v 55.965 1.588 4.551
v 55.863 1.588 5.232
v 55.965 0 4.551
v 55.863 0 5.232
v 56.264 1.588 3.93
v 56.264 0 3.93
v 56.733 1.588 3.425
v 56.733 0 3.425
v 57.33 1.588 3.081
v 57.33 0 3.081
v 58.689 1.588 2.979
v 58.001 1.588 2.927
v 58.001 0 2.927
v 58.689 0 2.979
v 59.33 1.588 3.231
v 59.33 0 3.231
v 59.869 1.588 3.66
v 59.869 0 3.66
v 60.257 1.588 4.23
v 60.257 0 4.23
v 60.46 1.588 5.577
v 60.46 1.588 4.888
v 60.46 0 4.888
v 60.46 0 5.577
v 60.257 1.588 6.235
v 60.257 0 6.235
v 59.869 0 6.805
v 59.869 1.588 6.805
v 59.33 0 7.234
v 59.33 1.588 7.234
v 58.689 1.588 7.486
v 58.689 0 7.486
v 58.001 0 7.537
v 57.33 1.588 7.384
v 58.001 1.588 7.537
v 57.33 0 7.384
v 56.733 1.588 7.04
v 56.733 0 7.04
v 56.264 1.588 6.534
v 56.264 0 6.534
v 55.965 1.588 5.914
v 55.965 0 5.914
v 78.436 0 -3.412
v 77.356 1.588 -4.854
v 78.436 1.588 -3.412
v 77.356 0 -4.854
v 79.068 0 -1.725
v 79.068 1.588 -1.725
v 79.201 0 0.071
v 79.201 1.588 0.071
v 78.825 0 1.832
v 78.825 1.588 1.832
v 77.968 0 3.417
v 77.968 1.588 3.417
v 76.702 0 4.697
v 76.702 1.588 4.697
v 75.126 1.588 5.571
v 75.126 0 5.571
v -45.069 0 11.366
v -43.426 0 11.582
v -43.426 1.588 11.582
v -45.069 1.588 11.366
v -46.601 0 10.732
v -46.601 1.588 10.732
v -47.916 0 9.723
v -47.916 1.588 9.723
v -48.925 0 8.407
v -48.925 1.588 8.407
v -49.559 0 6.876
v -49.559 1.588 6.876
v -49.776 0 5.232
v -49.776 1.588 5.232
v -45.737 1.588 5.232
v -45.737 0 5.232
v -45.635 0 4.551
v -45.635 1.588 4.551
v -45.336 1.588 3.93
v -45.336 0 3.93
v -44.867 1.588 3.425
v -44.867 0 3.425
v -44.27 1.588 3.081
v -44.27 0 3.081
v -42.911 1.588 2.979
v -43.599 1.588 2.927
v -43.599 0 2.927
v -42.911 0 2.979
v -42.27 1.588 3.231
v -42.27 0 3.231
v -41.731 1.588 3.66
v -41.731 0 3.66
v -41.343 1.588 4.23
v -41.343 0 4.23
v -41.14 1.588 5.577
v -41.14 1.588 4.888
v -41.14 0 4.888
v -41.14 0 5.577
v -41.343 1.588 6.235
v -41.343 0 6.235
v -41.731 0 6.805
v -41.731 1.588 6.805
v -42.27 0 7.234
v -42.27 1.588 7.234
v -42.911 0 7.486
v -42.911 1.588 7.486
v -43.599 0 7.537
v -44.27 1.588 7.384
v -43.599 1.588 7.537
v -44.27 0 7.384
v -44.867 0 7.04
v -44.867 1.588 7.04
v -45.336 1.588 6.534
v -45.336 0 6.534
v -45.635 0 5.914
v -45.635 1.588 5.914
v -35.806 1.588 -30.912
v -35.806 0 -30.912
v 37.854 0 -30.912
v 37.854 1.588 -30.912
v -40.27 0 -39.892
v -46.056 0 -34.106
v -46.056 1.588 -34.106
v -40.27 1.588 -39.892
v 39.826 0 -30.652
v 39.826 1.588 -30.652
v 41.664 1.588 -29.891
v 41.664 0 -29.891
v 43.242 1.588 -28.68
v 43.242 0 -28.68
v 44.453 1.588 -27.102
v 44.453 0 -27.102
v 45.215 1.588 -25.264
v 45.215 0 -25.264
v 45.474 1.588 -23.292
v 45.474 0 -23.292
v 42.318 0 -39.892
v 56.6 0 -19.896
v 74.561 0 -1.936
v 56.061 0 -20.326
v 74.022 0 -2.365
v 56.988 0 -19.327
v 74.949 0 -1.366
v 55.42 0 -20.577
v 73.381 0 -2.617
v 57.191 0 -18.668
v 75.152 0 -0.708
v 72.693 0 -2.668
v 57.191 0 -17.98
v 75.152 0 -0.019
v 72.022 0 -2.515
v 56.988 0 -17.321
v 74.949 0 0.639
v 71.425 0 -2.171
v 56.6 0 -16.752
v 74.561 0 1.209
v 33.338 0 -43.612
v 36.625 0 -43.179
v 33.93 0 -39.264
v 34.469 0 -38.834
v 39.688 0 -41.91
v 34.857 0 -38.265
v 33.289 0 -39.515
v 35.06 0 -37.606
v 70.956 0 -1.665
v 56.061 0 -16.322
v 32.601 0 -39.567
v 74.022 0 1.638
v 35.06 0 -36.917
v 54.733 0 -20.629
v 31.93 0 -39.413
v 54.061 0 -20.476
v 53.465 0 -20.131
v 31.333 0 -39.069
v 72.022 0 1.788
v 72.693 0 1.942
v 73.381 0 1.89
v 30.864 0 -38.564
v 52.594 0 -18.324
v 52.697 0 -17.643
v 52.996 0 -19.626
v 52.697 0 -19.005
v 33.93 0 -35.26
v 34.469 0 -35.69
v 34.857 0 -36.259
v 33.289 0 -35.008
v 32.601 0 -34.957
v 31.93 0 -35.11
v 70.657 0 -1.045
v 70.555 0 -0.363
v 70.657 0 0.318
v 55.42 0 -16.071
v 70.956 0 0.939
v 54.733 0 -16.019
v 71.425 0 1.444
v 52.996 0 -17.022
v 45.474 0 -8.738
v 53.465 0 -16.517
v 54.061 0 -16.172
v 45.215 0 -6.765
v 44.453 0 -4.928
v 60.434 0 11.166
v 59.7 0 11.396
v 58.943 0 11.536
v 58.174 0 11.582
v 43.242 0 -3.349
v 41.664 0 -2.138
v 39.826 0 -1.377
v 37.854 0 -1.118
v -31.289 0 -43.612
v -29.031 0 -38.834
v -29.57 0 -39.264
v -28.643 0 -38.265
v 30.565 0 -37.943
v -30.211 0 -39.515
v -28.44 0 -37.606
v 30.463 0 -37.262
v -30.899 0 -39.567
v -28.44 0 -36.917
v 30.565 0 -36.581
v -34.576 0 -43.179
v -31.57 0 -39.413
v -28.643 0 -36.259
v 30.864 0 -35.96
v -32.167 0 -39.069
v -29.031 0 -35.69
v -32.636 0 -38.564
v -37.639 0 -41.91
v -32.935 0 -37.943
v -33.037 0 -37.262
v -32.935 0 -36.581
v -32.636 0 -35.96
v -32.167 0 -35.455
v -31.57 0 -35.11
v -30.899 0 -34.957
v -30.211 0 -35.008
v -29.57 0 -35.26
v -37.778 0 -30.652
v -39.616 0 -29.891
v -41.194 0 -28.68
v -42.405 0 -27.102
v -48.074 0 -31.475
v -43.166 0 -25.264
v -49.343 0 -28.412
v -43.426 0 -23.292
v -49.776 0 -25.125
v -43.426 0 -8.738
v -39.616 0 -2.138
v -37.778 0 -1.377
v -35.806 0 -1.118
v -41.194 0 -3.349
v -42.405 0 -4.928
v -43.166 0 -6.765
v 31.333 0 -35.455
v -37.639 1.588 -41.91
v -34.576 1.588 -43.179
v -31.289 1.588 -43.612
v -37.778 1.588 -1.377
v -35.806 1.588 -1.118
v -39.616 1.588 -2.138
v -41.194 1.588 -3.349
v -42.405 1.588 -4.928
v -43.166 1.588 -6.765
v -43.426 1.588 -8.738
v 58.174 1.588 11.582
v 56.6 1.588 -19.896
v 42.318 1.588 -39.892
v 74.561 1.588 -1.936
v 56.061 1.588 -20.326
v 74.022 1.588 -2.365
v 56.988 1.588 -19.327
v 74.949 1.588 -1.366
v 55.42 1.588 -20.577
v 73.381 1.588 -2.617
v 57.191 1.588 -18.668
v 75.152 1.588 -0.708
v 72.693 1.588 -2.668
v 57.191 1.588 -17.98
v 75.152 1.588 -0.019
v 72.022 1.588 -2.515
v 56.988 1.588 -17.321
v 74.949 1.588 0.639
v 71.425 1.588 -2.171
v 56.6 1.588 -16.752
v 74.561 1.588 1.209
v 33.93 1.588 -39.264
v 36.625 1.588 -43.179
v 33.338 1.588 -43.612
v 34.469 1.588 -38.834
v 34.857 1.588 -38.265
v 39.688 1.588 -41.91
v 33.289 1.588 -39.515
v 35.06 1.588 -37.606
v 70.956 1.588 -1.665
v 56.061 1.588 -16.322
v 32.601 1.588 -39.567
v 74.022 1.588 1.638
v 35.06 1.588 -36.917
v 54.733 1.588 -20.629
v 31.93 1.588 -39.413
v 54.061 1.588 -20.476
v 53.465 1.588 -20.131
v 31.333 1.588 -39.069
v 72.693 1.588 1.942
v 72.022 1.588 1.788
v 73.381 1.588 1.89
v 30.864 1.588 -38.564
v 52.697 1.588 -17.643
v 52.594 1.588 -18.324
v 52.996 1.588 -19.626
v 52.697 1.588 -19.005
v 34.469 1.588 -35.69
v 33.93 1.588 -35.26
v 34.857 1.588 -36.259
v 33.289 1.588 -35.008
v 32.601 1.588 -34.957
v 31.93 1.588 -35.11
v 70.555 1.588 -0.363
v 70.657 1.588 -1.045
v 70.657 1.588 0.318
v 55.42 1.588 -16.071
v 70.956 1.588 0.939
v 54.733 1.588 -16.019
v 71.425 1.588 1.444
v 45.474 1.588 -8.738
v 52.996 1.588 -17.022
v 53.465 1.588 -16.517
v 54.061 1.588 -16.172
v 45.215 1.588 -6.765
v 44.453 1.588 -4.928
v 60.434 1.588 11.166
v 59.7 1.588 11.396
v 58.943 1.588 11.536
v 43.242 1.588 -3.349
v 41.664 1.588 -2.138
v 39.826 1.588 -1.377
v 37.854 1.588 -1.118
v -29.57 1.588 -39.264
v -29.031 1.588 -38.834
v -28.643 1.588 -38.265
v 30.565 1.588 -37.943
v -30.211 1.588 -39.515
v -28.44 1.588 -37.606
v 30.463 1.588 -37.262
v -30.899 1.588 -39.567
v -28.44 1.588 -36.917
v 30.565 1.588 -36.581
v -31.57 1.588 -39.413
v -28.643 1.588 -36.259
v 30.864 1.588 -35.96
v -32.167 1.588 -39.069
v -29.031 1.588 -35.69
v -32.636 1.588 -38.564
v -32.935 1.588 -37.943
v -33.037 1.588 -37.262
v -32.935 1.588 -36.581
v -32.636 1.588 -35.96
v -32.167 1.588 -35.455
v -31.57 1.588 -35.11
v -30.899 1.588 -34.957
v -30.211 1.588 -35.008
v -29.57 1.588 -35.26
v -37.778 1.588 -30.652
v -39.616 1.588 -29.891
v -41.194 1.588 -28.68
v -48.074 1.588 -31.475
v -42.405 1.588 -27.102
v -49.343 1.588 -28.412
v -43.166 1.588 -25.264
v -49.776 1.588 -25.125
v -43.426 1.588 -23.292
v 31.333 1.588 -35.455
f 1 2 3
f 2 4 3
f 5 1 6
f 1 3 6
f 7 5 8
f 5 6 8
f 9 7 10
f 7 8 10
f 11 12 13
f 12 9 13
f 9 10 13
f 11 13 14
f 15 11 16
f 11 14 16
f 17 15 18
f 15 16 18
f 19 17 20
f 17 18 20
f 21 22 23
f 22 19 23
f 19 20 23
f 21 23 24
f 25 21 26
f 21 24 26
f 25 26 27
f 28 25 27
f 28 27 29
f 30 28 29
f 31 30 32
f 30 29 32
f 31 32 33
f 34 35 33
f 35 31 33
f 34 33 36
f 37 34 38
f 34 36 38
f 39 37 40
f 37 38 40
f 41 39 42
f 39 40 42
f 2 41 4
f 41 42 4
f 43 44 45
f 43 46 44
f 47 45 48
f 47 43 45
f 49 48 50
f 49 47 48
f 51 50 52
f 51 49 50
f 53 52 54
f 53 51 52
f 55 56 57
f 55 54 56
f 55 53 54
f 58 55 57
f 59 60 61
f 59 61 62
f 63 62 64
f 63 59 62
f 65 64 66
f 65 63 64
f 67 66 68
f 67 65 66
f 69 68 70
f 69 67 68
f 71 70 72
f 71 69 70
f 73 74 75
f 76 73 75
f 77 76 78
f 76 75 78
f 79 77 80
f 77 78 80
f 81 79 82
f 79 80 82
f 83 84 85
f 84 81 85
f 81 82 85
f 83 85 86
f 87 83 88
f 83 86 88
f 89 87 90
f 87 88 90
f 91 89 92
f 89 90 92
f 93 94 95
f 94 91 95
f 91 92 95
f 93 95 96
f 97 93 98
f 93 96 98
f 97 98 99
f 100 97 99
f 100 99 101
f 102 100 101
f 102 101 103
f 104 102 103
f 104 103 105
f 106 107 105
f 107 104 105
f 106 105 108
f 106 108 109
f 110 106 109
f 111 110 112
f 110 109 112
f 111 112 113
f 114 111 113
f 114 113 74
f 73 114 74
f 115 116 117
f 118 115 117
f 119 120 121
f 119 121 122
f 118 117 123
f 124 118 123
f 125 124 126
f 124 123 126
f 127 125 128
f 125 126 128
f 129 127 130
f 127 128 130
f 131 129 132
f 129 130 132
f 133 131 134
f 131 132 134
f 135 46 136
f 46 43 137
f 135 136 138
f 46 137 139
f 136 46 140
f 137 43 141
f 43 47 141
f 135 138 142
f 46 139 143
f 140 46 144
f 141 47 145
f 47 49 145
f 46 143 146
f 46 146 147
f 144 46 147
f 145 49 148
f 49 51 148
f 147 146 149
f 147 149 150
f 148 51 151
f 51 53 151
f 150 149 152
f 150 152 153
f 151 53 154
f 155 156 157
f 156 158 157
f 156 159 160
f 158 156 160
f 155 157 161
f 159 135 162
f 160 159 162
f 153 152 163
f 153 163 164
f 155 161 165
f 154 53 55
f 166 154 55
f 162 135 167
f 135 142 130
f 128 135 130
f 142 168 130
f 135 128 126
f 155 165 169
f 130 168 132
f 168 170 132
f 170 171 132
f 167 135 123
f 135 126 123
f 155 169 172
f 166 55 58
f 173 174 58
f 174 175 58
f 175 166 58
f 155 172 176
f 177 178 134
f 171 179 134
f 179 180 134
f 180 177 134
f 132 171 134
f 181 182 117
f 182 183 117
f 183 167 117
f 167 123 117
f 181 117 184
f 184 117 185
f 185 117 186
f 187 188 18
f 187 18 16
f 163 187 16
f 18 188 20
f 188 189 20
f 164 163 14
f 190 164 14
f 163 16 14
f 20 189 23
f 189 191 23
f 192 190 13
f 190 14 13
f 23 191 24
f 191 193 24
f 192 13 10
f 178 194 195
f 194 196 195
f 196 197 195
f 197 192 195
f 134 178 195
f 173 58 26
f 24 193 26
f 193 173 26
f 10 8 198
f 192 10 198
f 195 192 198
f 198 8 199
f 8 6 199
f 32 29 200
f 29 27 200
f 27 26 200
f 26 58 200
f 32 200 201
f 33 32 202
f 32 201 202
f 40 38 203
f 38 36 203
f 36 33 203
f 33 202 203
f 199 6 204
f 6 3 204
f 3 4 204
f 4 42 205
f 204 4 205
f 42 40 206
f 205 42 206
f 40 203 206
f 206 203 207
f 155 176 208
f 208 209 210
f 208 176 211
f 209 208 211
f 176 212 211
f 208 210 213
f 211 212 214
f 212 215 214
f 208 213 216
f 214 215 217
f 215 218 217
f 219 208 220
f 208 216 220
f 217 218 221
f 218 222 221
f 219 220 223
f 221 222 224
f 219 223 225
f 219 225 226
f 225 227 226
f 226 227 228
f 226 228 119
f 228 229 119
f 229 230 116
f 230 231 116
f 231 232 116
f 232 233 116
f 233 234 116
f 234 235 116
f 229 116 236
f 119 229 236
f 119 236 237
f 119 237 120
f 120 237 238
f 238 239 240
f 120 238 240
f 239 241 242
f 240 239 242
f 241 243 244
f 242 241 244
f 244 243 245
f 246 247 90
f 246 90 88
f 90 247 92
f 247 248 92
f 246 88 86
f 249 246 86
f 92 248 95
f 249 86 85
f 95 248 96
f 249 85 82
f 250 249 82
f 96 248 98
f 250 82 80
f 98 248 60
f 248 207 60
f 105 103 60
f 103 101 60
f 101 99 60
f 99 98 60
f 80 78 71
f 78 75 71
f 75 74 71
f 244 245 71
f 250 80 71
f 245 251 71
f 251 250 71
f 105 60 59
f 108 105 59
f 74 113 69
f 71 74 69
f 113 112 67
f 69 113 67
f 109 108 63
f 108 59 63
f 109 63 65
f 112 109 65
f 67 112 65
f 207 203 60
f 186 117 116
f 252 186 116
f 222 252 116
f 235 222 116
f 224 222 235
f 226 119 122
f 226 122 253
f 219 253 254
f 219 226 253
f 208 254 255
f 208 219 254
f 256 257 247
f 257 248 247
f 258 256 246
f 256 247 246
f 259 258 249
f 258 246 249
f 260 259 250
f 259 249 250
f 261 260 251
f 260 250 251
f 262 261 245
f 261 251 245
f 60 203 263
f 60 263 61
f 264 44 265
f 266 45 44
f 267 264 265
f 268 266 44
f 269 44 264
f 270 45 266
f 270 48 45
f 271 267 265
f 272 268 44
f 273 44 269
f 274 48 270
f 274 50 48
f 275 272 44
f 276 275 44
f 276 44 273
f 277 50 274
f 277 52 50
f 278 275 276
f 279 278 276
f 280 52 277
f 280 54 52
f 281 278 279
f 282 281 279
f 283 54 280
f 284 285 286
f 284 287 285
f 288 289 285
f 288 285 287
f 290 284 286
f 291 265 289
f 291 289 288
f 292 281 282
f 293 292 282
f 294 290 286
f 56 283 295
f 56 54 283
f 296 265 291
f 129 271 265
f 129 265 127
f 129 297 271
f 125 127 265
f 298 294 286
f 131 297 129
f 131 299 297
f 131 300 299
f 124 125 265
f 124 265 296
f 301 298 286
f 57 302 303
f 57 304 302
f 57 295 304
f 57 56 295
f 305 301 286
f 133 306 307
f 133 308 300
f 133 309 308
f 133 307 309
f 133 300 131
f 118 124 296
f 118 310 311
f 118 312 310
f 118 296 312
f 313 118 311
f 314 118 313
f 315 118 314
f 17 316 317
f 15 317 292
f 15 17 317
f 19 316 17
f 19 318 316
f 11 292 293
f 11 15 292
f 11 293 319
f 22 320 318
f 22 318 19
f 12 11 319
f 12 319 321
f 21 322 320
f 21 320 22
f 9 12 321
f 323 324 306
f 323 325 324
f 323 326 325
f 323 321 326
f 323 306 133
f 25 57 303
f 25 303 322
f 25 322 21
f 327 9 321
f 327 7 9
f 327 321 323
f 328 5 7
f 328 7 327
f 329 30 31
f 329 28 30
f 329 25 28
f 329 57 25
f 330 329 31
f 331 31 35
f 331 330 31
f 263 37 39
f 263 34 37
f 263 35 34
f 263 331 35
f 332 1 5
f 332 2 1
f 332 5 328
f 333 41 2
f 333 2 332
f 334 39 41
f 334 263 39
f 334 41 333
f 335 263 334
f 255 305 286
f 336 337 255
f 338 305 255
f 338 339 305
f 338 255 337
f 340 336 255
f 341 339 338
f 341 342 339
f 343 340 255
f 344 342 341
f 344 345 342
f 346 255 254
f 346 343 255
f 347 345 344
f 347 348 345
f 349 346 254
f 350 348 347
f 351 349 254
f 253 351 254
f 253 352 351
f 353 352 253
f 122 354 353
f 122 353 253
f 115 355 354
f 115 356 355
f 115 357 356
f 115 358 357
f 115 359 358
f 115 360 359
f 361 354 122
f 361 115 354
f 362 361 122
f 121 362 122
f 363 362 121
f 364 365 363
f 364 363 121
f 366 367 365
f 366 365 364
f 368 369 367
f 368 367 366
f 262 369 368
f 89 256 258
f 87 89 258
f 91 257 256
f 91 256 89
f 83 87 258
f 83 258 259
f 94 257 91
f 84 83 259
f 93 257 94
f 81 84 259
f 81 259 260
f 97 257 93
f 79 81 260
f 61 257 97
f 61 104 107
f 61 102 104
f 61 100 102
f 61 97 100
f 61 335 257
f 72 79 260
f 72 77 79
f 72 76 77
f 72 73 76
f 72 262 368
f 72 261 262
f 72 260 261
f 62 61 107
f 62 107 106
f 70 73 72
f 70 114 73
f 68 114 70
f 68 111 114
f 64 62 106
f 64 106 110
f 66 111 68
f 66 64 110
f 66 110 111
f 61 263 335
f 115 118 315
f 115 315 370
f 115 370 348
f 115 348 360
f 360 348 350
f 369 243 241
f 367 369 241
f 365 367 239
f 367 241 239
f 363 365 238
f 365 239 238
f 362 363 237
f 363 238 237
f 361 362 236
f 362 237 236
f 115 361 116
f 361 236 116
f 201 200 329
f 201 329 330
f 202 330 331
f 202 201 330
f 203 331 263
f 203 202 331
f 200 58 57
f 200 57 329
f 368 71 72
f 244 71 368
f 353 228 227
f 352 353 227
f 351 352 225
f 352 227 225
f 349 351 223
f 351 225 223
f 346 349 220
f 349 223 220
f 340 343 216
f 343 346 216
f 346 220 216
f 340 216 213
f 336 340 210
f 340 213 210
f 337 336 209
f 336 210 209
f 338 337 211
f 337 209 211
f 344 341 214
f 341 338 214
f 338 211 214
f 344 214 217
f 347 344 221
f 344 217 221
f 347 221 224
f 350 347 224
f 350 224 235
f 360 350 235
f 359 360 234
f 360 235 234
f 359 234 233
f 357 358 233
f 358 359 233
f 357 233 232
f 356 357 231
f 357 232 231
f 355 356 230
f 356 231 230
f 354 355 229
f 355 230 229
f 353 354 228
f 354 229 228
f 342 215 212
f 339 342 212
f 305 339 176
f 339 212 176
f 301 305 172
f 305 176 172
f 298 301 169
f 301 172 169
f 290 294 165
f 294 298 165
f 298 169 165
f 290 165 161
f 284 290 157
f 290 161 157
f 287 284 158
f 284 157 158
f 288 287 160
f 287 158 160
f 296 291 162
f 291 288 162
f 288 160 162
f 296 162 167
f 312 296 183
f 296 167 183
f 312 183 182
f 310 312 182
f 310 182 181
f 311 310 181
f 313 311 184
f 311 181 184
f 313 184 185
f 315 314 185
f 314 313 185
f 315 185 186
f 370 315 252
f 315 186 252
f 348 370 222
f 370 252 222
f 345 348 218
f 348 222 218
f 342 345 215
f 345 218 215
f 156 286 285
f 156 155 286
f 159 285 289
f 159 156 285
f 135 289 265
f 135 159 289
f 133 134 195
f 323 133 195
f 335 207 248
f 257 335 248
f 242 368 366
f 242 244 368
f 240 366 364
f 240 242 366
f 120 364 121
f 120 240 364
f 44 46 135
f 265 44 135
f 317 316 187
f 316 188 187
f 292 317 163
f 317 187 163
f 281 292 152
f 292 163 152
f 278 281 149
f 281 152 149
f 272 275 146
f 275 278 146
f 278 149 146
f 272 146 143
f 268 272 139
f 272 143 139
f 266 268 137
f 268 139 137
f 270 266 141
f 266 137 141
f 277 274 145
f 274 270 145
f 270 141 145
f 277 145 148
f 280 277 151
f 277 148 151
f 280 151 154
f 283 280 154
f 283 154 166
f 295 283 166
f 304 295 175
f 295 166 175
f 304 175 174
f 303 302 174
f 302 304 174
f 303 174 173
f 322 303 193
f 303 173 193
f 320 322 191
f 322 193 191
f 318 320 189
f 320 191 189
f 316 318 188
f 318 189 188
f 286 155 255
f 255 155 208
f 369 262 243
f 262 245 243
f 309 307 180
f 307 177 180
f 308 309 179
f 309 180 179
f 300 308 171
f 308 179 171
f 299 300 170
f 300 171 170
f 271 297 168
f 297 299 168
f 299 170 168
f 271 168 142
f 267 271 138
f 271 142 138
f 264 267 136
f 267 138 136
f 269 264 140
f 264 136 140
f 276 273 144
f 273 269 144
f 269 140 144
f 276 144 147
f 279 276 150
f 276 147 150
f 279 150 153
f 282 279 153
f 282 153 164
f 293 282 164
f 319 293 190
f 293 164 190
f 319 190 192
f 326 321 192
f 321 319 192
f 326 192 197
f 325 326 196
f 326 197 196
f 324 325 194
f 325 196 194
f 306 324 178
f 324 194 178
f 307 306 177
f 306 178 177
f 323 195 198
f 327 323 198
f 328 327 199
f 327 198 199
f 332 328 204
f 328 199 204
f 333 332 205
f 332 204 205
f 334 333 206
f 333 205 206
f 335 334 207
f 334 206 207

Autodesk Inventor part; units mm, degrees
ref_plane "YZ Plane" through (0, 0, 0) normal (1, 0, 0) x (0, 1, 0)
ref_plane "XZ Plane" through (0, 0, 0) normal (0, 1, 0) x (-1, 0, 0)
ref_plane "XY Plane" through (0, 0, 0) normal (0, 0, 1) x (1, 0, 0)
sketch "Sketch1" plane through (0, 0, 0) normal (0, 1, 0) x (-1, 0, 0)
  line L0 (-37.8542, -1.1176) -> (35.8058, -1.1176)
  line L1 (43.4258, -8.7376) -> (43.4258, -23.2918)
  line L2 (35.8058, -30.9118) -> (-37.8542, -30.9118)
  line L3 (-45.4742, -23.2918) -> (-45.4742, -8.7376)
  arc A0 (-37.8542, -1.1176) -> (-45.4742, -8.7376) centre (-37.8542, -8.7376) ccw
  arc A1 (-45.4742, -23.2918) -> (-37.8542, -30.9118) centre (-37.8542, -23.2918) ccw
  arc A2 (35.8058, -30.9118) -> (43.4258, -23.2918) centre (35.8058, -23.2918) ccw
  arc A3 (43.4258, -8.7376) -> (35.8058, -1.1176) centre (35.8058, -8.7376) ccw
  circle A4 centre (-72.8662, -0.3634) radius 2.3114
  circle A5 centre (-54.9057, -18.324) radius 2.3114
  circle A6 centre (-58.1742, 5.2324) radius 2.3114
  circle A7 centre (-32.7742, -37.2618) radius 2.3114
  circle A8 centre (30.7258, -37.2618) radius 2.3114
  circle A9 centre (43.4258, 5.2324) radius 2.3114
  arc A10 (49.7758, 5.2324) -> (43.4258, 11.5824) centre (43.4258, 5.2324) ccw
  arc A11 (-75.1264, 5.5707) -> (-77.3564, -4.8536) centre (-72.8662, -0.3634) ccw
  arc A12 (-58.1742, 11.5824) -> (-60.4344, 11.1665) centre (-58.1742, 5.2324) ccw
  line L4 (35.8058, -30.9118) -> (-37.8542, -30.9118)
  line L5 (-75.1264, 5.5707) -> (-60.4344, 11.1665)
  line L6 (-77.3564, -4.8536) -> (-42.3179, -39.8921)
  line L7 (-33.3376, -43.6118) -> (31.2893, -43.6118)
  line L8 (-58.1742, 11.5824) -> (43.4258, 11.5824)
  arc A13 (-42.3179, -39.8921) -> (-33.3376, -43.6118) centre (-33.3376, -30.9118) ccw
  arc A14 (35.8058, -30.9118) -> (43.4258, -23.2918) centre (35.8058, -23.2918) ccw
  line L9 (46.0561, -34.1055) -> (40.2695, -39.8921)
  arc A15 (31.2893, -43.6118) -> (40.2695, -39.8921) centre (31.2893, -30.9118) ccw
  line L10 (49.7758, 5.2324) -> (49.7758, -25.1252)
  arc A16 (46.0561, -34.1055) -> (49.7758, -25.1252) centre (37.0758, -25.1252) ccw
  point P0 (0, 0)
  point P1 (43.4258, -30.9118)
  point P2 (43.4258, -1.1176)
  point P3 (-45.4742, -30.9118)
  point P4 (43.4258, -30.9118)
  point P5 (41.194, -28.68)
  dimension "d2" = 7.62
  dimension "d21" = 12.7
extrude "Extrusion1" add sketch "Sketch1" along normal blind 1.5875
properties part number "gusset-2-3.25-full-no-front"
